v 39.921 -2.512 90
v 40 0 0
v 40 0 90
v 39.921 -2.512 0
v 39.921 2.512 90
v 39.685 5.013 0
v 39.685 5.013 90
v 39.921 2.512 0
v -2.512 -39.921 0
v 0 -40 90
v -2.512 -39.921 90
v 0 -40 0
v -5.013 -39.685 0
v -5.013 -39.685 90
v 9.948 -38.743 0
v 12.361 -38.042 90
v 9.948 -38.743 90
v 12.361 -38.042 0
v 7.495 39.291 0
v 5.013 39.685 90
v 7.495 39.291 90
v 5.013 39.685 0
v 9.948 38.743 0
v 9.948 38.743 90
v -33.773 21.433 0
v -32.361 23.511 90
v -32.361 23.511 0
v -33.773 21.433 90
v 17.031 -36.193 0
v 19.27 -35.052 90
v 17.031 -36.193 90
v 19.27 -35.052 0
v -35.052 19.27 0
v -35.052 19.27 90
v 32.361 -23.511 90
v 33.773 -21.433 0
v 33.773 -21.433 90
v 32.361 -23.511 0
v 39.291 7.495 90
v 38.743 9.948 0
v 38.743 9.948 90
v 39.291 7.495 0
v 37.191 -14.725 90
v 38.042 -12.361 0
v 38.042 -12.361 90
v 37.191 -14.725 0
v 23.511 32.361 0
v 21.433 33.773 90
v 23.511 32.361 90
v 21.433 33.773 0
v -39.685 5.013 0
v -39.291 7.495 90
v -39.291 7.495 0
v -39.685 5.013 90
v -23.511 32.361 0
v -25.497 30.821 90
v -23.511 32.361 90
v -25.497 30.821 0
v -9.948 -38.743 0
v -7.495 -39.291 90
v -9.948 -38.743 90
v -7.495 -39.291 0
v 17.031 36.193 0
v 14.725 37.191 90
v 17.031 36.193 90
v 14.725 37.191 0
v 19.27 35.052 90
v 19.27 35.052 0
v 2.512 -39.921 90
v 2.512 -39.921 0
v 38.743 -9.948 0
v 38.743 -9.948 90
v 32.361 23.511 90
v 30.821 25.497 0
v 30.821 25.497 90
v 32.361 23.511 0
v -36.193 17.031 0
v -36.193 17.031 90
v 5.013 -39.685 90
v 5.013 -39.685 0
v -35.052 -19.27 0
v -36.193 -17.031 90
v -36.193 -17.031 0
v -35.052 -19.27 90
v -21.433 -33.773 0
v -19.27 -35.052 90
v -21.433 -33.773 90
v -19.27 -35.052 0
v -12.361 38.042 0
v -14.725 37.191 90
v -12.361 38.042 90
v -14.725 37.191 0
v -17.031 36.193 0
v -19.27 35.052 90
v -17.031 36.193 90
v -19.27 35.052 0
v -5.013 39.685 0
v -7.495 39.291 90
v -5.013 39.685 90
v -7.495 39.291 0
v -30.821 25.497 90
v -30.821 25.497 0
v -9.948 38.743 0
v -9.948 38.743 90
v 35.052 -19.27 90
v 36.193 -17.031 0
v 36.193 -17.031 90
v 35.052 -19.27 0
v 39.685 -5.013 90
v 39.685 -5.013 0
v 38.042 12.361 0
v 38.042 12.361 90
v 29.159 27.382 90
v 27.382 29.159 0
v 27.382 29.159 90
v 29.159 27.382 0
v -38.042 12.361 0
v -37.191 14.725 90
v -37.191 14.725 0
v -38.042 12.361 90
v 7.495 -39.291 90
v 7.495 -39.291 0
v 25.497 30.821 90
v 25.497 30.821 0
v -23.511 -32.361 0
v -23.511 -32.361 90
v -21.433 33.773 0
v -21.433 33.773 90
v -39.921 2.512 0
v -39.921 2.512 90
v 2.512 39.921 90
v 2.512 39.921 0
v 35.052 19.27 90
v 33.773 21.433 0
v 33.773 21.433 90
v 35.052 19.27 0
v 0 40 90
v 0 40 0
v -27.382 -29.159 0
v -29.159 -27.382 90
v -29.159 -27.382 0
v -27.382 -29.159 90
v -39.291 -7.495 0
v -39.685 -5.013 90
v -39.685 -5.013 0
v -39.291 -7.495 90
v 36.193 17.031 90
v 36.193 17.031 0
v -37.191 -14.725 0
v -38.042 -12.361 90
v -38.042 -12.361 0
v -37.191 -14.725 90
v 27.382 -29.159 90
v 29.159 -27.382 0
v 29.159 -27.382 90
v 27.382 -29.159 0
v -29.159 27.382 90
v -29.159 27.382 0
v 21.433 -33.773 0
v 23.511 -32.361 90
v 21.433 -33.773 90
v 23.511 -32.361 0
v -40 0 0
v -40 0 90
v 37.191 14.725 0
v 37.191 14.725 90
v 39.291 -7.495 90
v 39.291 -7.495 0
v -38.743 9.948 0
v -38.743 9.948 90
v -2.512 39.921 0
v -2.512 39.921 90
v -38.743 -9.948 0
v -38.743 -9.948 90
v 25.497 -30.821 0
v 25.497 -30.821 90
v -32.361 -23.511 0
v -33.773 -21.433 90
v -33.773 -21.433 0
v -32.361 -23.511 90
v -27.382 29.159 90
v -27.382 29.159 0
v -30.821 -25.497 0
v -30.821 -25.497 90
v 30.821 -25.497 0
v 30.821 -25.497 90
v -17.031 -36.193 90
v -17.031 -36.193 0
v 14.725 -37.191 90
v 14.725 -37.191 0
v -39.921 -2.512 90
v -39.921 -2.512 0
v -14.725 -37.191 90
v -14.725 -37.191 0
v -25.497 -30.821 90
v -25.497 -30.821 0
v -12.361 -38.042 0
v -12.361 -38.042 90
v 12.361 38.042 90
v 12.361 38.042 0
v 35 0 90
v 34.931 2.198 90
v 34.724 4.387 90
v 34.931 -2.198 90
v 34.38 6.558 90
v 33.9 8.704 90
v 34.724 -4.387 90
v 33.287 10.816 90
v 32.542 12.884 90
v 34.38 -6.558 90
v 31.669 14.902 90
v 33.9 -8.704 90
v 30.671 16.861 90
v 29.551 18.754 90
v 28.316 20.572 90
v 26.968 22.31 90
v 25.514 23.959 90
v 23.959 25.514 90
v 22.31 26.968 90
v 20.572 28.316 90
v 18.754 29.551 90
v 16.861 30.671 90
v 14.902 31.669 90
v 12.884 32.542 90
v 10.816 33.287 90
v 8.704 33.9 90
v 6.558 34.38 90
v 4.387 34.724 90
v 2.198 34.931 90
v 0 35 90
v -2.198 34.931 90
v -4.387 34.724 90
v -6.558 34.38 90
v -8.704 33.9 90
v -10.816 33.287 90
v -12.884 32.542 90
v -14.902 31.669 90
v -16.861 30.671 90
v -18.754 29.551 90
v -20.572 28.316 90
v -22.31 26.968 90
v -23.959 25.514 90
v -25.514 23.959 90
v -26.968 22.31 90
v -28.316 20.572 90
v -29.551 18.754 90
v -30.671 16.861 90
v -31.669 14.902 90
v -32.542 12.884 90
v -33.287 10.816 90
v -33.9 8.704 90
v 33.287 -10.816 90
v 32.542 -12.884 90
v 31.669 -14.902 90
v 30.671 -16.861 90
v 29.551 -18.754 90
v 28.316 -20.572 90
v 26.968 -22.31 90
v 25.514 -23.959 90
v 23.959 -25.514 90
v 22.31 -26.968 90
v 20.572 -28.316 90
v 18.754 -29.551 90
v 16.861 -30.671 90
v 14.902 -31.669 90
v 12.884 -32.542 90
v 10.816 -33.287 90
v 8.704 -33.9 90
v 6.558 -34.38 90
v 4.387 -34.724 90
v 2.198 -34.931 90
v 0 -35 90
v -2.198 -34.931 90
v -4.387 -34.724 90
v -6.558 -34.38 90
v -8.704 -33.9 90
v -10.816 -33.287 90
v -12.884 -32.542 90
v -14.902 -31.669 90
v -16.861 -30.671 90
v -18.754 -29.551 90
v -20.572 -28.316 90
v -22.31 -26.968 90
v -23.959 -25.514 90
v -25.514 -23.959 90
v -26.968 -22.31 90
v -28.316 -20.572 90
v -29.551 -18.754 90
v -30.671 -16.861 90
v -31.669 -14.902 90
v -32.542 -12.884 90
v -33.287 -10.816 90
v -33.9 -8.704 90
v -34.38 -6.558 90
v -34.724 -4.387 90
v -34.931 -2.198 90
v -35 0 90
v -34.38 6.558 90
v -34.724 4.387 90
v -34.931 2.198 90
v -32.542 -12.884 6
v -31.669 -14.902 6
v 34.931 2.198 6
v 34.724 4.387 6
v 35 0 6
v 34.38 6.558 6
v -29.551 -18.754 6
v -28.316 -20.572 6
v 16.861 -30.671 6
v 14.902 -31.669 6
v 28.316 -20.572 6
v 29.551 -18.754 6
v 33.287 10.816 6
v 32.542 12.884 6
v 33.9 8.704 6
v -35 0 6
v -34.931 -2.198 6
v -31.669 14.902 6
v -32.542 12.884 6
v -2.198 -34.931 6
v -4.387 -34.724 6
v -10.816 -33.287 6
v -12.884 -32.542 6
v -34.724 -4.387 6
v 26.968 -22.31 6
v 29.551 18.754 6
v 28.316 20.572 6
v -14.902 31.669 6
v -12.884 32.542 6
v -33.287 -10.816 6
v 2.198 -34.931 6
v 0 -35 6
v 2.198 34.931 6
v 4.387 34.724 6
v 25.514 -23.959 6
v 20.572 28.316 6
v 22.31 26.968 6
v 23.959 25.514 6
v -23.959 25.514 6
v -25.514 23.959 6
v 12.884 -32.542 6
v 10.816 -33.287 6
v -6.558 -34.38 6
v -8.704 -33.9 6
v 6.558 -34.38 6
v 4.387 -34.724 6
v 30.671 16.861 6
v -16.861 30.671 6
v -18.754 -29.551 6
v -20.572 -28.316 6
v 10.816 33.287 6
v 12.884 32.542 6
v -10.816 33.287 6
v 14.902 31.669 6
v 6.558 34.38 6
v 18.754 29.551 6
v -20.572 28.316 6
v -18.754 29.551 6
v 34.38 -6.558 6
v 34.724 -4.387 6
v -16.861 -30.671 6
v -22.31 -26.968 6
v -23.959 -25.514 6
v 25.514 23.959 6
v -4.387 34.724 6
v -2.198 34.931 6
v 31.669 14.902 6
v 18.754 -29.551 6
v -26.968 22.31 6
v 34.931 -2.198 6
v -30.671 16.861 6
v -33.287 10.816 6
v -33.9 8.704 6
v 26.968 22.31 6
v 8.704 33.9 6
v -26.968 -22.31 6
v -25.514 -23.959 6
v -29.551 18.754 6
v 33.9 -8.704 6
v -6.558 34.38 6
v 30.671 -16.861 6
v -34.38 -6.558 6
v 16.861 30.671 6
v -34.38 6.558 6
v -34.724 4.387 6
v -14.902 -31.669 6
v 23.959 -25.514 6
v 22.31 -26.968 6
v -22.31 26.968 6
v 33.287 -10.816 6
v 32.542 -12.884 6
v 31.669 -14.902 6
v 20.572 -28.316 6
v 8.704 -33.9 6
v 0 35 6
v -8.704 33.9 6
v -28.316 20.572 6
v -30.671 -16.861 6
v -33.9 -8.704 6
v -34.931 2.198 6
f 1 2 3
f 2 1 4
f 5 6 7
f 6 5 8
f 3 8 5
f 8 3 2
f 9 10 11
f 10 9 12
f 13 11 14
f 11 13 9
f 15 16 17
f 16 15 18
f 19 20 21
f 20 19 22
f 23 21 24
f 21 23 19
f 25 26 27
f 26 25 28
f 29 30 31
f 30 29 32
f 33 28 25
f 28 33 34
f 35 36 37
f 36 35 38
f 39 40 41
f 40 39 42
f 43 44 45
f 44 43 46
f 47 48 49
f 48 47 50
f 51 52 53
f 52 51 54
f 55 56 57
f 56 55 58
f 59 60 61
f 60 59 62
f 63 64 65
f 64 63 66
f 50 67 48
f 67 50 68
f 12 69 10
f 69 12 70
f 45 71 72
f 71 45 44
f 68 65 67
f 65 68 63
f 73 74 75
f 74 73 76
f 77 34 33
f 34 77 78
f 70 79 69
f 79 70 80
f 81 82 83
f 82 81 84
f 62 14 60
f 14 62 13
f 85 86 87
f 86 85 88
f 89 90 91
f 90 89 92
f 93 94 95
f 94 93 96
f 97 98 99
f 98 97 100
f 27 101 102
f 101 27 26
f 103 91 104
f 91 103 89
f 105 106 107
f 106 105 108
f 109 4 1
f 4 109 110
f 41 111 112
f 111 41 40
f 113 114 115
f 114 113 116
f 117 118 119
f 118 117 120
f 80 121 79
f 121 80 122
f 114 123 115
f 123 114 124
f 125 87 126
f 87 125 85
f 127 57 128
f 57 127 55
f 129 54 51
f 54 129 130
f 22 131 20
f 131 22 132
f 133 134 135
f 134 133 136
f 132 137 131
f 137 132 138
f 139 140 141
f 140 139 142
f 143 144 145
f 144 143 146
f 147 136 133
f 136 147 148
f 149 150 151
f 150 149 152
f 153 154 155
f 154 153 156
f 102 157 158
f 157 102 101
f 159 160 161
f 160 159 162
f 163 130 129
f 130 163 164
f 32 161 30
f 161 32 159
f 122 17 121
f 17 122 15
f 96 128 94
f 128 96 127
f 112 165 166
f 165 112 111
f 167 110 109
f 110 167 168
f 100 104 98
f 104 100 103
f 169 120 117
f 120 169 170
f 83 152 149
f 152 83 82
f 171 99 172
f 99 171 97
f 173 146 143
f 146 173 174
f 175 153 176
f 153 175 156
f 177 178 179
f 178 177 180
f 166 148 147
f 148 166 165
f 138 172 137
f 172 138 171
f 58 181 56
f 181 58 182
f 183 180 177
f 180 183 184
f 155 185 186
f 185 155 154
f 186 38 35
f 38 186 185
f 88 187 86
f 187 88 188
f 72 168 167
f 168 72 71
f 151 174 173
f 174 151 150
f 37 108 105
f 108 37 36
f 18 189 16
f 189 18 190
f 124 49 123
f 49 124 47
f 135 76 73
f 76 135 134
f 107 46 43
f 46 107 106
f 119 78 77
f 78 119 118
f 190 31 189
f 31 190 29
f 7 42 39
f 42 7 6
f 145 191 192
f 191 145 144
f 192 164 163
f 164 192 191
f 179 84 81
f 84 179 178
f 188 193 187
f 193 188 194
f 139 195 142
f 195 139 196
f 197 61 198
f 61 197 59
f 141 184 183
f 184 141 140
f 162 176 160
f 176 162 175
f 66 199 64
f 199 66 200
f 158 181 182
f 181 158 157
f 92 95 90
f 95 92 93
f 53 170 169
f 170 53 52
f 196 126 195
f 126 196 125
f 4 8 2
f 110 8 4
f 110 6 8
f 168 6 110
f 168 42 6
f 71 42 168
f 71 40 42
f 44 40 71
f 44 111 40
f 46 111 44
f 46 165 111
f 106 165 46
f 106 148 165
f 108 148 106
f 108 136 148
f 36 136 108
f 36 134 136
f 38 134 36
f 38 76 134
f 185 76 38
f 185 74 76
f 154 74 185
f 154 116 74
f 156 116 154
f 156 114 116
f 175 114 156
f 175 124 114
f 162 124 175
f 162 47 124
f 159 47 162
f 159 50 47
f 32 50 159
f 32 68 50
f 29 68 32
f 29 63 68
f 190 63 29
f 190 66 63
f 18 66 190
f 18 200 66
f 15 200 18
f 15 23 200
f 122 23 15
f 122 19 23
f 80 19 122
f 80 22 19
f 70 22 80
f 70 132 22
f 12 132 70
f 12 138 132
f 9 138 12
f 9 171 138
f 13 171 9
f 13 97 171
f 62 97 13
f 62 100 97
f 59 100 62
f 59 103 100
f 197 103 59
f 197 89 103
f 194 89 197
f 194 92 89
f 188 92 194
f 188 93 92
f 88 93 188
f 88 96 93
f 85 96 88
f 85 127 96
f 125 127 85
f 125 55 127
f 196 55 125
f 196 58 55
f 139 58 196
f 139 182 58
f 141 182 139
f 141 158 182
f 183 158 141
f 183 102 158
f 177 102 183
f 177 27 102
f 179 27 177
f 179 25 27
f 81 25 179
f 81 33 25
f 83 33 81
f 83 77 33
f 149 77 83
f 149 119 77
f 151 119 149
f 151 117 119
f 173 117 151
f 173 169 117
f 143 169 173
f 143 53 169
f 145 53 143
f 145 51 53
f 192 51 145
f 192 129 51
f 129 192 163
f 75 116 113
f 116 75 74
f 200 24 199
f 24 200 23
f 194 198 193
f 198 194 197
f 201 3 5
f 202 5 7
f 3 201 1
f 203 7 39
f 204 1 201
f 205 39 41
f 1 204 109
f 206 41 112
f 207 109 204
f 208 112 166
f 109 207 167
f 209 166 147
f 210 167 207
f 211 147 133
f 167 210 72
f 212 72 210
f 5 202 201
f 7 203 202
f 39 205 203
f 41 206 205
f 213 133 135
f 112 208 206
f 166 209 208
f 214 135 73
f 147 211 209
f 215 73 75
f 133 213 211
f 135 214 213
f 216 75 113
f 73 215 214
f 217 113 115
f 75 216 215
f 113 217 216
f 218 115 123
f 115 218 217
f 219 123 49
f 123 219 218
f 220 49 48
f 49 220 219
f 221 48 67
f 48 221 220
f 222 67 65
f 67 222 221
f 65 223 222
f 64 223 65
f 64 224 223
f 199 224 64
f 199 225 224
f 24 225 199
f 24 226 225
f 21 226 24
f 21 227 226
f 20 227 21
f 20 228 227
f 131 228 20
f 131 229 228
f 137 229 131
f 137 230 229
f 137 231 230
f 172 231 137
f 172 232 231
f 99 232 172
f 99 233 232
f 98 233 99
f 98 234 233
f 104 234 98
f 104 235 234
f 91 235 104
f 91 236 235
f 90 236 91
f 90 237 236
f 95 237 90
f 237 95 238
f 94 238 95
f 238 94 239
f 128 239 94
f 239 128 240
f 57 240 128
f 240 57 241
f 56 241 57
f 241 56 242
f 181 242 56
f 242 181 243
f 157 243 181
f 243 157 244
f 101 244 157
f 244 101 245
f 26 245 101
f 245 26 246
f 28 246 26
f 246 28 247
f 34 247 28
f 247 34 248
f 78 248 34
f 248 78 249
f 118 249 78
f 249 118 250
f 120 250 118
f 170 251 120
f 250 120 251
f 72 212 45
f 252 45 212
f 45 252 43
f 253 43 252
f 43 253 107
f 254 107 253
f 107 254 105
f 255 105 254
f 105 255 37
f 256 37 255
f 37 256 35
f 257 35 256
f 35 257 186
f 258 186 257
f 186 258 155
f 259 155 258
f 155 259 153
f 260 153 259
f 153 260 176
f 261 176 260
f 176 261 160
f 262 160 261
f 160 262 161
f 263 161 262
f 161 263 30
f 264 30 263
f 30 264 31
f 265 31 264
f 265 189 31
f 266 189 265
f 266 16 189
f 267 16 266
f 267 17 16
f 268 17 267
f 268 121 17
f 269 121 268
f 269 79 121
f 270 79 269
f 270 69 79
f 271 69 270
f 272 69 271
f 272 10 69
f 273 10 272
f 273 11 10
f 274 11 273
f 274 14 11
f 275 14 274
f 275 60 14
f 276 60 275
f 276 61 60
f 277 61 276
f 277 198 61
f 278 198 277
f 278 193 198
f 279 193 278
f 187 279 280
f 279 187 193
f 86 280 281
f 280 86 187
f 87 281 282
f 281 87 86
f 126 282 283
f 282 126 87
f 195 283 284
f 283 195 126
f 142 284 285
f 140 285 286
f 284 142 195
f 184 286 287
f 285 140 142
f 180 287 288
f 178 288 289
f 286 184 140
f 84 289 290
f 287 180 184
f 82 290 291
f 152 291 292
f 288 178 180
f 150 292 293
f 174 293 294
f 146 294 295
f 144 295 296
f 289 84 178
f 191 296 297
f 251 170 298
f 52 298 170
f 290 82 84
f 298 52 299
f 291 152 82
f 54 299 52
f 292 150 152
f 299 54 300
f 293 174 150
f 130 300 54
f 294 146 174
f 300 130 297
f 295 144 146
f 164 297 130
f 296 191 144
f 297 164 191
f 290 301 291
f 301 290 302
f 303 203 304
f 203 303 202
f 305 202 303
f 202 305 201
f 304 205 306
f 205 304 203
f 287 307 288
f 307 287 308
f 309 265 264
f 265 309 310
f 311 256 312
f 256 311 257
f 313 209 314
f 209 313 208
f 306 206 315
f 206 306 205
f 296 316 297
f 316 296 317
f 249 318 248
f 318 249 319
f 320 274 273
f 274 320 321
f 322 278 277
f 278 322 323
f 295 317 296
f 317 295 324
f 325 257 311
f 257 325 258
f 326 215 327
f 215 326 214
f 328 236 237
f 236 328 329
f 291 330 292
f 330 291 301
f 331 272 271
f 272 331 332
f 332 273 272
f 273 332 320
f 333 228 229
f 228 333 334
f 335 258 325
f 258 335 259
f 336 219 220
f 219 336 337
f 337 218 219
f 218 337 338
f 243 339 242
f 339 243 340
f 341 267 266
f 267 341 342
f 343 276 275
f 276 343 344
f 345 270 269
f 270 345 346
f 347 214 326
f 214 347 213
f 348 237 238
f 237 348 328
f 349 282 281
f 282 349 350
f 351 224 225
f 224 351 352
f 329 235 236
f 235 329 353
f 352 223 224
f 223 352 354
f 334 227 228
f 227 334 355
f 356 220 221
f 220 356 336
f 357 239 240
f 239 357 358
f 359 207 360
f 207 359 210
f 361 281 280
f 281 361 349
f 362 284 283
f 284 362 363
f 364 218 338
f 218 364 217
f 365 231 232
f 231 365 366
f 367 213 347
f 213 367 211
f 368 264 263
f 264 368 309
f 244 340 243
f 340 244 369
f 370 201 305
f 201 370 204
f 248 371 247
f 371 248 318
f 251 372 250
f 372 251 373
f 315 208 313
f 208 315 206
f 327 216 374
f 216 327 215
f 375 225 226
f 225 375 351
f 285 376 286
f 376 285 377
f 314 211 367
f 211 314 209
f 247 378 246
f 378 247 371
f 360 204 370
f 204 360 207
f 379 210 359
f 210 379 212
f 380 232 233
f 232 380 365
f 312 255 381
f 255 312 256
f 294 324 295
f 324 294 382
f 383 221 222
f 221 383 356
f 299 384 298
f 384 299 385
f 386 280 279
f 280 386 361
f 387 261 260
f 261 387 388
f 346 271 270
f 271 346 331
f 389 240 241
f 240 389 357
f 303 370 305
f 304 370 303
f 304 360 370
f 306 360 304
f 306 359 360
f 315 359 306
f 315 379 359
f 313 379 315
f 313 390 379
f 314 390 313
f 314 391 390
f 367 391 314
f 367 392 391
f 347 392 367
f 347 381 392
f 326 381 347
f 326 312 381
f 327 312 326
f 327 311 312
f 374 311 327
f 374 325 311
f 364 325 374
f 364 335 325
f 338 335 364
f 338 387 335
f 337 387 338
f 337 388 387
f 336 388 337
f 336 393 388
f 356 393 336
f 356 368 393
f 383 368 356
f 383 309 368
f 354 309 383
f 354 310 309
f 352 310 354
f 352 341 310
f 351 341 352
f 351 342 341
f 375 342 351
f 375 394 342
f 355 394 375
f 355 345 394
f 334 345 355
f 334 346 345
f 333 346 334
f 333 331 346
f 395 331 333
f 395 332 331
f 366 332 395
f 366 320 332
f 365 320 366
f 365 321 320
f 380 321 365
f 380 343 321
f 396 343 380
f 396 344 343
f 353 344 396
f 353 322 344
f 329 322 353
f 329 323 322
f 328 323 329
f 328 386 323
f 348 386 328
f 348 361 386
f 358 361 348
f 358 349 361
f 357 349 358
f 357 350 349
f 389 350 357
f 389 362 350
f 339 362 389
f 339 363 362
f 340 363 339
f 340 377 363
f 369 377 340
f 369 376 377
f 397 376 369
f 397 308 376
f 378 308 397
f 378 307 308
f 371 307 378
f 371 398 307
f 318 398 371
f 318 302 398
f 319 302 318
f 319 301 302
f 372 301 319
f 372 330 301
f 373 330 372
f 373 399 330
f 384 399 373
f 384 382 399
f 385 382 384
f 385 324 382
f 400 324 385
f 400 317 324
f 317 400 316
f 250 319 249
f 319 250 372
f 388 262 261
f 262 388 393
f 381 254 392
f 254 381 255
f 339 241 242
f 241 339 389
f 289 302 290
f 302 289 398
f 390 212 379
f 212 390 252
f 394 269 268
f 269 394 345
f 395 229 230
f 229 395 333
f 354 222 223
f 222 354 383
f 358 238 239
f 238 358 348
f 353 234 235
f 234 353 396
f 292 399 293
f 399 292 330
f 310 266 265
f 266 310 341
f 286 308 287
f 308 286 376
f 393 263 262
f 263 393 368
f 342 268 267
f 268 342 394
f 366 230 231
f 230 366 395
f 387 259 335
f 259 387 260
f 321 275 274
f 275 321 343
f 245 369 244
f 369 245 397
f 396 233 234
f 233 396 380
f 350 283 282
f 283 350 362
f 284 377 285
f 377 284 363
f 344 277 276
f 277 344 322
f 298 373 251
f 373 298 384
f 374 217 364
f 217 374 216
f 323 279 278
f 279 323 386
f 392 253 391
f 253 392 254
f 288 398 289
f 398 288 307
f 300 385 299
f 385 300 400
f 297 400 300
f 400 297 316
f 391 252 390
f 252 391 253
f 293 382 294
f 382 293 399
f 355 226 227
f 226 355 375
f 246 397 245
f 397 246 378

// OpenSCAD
// マグカップ

$fn = 100;

// 本体パラメータ
outer_d = 80;
inner_d = 70;
height = 90;
bottom_thickness = 6;

// 取手パラメータ
handle_inner_h = 30;   // 取手内側の高さ
handle_inner_w = 25;   // 取手内側の幅(本体からの突き出し)
handle_thickness = 8;  // 取手の太さ(指を握る部分の太さ)

module mug_body() {
    difference() {
        cylinder(d = outer_d, h = height);
        translate([0, 0, bottom_thickness])
            cylinder(d = inner_d, h = height);
    }
}

module handle() {
    // 取手の外形と内側の空間
    // 取手は +X 側に配置
    // 外側 D 形状: 全体高さ = handle_inner_h + 2*handle_thickness
    // 全体幅 = handle_inner_w + handle_thickness(本体側は本体内に埋め込む)
    
    handle_outer_h = handle_inner_h + 2 * handle_thickness;
    handle_outer_w = handle_inner_w + handle_thickness;
    
    // 中央高さに配置
    z_center = height / 2;
    
    // 本体側へ少し食い込ませて確実にunion
    x_start = outer_d/2 - 2;
    
    translate([x_start, 0, z_center])
        rotate([90, 0, 0])
            linear_extrude(height = handle_outer_h, center = true)
                difference() {
                    // 外形 D 字
                    hull() {
                        // 本体側の直線部分(細い長方形)
                        translate([0, -handle_outer_h/2 + handle_outer_h/2, 0])
                            square([0.1, handle_outer_h], center = true);
                        // 外側の半円
                        translate([handle_outer_w - handle_outer_h/2, 0])
                            circle(d = handle_outer_h);
                    }
                    // 内側の穴(D字の内側)
                    hull() {
                        translate([handle_thickness, 0, 0])
                            square([0.1, handle_inner_h], center = true);
                        translate([handle_thickness + handle_inner_w - handle_inner_h/2, 0])
                            circle(d = handle_inner_h);
                    }
                }
}

union() {
    mug_body();
    handle();
}
